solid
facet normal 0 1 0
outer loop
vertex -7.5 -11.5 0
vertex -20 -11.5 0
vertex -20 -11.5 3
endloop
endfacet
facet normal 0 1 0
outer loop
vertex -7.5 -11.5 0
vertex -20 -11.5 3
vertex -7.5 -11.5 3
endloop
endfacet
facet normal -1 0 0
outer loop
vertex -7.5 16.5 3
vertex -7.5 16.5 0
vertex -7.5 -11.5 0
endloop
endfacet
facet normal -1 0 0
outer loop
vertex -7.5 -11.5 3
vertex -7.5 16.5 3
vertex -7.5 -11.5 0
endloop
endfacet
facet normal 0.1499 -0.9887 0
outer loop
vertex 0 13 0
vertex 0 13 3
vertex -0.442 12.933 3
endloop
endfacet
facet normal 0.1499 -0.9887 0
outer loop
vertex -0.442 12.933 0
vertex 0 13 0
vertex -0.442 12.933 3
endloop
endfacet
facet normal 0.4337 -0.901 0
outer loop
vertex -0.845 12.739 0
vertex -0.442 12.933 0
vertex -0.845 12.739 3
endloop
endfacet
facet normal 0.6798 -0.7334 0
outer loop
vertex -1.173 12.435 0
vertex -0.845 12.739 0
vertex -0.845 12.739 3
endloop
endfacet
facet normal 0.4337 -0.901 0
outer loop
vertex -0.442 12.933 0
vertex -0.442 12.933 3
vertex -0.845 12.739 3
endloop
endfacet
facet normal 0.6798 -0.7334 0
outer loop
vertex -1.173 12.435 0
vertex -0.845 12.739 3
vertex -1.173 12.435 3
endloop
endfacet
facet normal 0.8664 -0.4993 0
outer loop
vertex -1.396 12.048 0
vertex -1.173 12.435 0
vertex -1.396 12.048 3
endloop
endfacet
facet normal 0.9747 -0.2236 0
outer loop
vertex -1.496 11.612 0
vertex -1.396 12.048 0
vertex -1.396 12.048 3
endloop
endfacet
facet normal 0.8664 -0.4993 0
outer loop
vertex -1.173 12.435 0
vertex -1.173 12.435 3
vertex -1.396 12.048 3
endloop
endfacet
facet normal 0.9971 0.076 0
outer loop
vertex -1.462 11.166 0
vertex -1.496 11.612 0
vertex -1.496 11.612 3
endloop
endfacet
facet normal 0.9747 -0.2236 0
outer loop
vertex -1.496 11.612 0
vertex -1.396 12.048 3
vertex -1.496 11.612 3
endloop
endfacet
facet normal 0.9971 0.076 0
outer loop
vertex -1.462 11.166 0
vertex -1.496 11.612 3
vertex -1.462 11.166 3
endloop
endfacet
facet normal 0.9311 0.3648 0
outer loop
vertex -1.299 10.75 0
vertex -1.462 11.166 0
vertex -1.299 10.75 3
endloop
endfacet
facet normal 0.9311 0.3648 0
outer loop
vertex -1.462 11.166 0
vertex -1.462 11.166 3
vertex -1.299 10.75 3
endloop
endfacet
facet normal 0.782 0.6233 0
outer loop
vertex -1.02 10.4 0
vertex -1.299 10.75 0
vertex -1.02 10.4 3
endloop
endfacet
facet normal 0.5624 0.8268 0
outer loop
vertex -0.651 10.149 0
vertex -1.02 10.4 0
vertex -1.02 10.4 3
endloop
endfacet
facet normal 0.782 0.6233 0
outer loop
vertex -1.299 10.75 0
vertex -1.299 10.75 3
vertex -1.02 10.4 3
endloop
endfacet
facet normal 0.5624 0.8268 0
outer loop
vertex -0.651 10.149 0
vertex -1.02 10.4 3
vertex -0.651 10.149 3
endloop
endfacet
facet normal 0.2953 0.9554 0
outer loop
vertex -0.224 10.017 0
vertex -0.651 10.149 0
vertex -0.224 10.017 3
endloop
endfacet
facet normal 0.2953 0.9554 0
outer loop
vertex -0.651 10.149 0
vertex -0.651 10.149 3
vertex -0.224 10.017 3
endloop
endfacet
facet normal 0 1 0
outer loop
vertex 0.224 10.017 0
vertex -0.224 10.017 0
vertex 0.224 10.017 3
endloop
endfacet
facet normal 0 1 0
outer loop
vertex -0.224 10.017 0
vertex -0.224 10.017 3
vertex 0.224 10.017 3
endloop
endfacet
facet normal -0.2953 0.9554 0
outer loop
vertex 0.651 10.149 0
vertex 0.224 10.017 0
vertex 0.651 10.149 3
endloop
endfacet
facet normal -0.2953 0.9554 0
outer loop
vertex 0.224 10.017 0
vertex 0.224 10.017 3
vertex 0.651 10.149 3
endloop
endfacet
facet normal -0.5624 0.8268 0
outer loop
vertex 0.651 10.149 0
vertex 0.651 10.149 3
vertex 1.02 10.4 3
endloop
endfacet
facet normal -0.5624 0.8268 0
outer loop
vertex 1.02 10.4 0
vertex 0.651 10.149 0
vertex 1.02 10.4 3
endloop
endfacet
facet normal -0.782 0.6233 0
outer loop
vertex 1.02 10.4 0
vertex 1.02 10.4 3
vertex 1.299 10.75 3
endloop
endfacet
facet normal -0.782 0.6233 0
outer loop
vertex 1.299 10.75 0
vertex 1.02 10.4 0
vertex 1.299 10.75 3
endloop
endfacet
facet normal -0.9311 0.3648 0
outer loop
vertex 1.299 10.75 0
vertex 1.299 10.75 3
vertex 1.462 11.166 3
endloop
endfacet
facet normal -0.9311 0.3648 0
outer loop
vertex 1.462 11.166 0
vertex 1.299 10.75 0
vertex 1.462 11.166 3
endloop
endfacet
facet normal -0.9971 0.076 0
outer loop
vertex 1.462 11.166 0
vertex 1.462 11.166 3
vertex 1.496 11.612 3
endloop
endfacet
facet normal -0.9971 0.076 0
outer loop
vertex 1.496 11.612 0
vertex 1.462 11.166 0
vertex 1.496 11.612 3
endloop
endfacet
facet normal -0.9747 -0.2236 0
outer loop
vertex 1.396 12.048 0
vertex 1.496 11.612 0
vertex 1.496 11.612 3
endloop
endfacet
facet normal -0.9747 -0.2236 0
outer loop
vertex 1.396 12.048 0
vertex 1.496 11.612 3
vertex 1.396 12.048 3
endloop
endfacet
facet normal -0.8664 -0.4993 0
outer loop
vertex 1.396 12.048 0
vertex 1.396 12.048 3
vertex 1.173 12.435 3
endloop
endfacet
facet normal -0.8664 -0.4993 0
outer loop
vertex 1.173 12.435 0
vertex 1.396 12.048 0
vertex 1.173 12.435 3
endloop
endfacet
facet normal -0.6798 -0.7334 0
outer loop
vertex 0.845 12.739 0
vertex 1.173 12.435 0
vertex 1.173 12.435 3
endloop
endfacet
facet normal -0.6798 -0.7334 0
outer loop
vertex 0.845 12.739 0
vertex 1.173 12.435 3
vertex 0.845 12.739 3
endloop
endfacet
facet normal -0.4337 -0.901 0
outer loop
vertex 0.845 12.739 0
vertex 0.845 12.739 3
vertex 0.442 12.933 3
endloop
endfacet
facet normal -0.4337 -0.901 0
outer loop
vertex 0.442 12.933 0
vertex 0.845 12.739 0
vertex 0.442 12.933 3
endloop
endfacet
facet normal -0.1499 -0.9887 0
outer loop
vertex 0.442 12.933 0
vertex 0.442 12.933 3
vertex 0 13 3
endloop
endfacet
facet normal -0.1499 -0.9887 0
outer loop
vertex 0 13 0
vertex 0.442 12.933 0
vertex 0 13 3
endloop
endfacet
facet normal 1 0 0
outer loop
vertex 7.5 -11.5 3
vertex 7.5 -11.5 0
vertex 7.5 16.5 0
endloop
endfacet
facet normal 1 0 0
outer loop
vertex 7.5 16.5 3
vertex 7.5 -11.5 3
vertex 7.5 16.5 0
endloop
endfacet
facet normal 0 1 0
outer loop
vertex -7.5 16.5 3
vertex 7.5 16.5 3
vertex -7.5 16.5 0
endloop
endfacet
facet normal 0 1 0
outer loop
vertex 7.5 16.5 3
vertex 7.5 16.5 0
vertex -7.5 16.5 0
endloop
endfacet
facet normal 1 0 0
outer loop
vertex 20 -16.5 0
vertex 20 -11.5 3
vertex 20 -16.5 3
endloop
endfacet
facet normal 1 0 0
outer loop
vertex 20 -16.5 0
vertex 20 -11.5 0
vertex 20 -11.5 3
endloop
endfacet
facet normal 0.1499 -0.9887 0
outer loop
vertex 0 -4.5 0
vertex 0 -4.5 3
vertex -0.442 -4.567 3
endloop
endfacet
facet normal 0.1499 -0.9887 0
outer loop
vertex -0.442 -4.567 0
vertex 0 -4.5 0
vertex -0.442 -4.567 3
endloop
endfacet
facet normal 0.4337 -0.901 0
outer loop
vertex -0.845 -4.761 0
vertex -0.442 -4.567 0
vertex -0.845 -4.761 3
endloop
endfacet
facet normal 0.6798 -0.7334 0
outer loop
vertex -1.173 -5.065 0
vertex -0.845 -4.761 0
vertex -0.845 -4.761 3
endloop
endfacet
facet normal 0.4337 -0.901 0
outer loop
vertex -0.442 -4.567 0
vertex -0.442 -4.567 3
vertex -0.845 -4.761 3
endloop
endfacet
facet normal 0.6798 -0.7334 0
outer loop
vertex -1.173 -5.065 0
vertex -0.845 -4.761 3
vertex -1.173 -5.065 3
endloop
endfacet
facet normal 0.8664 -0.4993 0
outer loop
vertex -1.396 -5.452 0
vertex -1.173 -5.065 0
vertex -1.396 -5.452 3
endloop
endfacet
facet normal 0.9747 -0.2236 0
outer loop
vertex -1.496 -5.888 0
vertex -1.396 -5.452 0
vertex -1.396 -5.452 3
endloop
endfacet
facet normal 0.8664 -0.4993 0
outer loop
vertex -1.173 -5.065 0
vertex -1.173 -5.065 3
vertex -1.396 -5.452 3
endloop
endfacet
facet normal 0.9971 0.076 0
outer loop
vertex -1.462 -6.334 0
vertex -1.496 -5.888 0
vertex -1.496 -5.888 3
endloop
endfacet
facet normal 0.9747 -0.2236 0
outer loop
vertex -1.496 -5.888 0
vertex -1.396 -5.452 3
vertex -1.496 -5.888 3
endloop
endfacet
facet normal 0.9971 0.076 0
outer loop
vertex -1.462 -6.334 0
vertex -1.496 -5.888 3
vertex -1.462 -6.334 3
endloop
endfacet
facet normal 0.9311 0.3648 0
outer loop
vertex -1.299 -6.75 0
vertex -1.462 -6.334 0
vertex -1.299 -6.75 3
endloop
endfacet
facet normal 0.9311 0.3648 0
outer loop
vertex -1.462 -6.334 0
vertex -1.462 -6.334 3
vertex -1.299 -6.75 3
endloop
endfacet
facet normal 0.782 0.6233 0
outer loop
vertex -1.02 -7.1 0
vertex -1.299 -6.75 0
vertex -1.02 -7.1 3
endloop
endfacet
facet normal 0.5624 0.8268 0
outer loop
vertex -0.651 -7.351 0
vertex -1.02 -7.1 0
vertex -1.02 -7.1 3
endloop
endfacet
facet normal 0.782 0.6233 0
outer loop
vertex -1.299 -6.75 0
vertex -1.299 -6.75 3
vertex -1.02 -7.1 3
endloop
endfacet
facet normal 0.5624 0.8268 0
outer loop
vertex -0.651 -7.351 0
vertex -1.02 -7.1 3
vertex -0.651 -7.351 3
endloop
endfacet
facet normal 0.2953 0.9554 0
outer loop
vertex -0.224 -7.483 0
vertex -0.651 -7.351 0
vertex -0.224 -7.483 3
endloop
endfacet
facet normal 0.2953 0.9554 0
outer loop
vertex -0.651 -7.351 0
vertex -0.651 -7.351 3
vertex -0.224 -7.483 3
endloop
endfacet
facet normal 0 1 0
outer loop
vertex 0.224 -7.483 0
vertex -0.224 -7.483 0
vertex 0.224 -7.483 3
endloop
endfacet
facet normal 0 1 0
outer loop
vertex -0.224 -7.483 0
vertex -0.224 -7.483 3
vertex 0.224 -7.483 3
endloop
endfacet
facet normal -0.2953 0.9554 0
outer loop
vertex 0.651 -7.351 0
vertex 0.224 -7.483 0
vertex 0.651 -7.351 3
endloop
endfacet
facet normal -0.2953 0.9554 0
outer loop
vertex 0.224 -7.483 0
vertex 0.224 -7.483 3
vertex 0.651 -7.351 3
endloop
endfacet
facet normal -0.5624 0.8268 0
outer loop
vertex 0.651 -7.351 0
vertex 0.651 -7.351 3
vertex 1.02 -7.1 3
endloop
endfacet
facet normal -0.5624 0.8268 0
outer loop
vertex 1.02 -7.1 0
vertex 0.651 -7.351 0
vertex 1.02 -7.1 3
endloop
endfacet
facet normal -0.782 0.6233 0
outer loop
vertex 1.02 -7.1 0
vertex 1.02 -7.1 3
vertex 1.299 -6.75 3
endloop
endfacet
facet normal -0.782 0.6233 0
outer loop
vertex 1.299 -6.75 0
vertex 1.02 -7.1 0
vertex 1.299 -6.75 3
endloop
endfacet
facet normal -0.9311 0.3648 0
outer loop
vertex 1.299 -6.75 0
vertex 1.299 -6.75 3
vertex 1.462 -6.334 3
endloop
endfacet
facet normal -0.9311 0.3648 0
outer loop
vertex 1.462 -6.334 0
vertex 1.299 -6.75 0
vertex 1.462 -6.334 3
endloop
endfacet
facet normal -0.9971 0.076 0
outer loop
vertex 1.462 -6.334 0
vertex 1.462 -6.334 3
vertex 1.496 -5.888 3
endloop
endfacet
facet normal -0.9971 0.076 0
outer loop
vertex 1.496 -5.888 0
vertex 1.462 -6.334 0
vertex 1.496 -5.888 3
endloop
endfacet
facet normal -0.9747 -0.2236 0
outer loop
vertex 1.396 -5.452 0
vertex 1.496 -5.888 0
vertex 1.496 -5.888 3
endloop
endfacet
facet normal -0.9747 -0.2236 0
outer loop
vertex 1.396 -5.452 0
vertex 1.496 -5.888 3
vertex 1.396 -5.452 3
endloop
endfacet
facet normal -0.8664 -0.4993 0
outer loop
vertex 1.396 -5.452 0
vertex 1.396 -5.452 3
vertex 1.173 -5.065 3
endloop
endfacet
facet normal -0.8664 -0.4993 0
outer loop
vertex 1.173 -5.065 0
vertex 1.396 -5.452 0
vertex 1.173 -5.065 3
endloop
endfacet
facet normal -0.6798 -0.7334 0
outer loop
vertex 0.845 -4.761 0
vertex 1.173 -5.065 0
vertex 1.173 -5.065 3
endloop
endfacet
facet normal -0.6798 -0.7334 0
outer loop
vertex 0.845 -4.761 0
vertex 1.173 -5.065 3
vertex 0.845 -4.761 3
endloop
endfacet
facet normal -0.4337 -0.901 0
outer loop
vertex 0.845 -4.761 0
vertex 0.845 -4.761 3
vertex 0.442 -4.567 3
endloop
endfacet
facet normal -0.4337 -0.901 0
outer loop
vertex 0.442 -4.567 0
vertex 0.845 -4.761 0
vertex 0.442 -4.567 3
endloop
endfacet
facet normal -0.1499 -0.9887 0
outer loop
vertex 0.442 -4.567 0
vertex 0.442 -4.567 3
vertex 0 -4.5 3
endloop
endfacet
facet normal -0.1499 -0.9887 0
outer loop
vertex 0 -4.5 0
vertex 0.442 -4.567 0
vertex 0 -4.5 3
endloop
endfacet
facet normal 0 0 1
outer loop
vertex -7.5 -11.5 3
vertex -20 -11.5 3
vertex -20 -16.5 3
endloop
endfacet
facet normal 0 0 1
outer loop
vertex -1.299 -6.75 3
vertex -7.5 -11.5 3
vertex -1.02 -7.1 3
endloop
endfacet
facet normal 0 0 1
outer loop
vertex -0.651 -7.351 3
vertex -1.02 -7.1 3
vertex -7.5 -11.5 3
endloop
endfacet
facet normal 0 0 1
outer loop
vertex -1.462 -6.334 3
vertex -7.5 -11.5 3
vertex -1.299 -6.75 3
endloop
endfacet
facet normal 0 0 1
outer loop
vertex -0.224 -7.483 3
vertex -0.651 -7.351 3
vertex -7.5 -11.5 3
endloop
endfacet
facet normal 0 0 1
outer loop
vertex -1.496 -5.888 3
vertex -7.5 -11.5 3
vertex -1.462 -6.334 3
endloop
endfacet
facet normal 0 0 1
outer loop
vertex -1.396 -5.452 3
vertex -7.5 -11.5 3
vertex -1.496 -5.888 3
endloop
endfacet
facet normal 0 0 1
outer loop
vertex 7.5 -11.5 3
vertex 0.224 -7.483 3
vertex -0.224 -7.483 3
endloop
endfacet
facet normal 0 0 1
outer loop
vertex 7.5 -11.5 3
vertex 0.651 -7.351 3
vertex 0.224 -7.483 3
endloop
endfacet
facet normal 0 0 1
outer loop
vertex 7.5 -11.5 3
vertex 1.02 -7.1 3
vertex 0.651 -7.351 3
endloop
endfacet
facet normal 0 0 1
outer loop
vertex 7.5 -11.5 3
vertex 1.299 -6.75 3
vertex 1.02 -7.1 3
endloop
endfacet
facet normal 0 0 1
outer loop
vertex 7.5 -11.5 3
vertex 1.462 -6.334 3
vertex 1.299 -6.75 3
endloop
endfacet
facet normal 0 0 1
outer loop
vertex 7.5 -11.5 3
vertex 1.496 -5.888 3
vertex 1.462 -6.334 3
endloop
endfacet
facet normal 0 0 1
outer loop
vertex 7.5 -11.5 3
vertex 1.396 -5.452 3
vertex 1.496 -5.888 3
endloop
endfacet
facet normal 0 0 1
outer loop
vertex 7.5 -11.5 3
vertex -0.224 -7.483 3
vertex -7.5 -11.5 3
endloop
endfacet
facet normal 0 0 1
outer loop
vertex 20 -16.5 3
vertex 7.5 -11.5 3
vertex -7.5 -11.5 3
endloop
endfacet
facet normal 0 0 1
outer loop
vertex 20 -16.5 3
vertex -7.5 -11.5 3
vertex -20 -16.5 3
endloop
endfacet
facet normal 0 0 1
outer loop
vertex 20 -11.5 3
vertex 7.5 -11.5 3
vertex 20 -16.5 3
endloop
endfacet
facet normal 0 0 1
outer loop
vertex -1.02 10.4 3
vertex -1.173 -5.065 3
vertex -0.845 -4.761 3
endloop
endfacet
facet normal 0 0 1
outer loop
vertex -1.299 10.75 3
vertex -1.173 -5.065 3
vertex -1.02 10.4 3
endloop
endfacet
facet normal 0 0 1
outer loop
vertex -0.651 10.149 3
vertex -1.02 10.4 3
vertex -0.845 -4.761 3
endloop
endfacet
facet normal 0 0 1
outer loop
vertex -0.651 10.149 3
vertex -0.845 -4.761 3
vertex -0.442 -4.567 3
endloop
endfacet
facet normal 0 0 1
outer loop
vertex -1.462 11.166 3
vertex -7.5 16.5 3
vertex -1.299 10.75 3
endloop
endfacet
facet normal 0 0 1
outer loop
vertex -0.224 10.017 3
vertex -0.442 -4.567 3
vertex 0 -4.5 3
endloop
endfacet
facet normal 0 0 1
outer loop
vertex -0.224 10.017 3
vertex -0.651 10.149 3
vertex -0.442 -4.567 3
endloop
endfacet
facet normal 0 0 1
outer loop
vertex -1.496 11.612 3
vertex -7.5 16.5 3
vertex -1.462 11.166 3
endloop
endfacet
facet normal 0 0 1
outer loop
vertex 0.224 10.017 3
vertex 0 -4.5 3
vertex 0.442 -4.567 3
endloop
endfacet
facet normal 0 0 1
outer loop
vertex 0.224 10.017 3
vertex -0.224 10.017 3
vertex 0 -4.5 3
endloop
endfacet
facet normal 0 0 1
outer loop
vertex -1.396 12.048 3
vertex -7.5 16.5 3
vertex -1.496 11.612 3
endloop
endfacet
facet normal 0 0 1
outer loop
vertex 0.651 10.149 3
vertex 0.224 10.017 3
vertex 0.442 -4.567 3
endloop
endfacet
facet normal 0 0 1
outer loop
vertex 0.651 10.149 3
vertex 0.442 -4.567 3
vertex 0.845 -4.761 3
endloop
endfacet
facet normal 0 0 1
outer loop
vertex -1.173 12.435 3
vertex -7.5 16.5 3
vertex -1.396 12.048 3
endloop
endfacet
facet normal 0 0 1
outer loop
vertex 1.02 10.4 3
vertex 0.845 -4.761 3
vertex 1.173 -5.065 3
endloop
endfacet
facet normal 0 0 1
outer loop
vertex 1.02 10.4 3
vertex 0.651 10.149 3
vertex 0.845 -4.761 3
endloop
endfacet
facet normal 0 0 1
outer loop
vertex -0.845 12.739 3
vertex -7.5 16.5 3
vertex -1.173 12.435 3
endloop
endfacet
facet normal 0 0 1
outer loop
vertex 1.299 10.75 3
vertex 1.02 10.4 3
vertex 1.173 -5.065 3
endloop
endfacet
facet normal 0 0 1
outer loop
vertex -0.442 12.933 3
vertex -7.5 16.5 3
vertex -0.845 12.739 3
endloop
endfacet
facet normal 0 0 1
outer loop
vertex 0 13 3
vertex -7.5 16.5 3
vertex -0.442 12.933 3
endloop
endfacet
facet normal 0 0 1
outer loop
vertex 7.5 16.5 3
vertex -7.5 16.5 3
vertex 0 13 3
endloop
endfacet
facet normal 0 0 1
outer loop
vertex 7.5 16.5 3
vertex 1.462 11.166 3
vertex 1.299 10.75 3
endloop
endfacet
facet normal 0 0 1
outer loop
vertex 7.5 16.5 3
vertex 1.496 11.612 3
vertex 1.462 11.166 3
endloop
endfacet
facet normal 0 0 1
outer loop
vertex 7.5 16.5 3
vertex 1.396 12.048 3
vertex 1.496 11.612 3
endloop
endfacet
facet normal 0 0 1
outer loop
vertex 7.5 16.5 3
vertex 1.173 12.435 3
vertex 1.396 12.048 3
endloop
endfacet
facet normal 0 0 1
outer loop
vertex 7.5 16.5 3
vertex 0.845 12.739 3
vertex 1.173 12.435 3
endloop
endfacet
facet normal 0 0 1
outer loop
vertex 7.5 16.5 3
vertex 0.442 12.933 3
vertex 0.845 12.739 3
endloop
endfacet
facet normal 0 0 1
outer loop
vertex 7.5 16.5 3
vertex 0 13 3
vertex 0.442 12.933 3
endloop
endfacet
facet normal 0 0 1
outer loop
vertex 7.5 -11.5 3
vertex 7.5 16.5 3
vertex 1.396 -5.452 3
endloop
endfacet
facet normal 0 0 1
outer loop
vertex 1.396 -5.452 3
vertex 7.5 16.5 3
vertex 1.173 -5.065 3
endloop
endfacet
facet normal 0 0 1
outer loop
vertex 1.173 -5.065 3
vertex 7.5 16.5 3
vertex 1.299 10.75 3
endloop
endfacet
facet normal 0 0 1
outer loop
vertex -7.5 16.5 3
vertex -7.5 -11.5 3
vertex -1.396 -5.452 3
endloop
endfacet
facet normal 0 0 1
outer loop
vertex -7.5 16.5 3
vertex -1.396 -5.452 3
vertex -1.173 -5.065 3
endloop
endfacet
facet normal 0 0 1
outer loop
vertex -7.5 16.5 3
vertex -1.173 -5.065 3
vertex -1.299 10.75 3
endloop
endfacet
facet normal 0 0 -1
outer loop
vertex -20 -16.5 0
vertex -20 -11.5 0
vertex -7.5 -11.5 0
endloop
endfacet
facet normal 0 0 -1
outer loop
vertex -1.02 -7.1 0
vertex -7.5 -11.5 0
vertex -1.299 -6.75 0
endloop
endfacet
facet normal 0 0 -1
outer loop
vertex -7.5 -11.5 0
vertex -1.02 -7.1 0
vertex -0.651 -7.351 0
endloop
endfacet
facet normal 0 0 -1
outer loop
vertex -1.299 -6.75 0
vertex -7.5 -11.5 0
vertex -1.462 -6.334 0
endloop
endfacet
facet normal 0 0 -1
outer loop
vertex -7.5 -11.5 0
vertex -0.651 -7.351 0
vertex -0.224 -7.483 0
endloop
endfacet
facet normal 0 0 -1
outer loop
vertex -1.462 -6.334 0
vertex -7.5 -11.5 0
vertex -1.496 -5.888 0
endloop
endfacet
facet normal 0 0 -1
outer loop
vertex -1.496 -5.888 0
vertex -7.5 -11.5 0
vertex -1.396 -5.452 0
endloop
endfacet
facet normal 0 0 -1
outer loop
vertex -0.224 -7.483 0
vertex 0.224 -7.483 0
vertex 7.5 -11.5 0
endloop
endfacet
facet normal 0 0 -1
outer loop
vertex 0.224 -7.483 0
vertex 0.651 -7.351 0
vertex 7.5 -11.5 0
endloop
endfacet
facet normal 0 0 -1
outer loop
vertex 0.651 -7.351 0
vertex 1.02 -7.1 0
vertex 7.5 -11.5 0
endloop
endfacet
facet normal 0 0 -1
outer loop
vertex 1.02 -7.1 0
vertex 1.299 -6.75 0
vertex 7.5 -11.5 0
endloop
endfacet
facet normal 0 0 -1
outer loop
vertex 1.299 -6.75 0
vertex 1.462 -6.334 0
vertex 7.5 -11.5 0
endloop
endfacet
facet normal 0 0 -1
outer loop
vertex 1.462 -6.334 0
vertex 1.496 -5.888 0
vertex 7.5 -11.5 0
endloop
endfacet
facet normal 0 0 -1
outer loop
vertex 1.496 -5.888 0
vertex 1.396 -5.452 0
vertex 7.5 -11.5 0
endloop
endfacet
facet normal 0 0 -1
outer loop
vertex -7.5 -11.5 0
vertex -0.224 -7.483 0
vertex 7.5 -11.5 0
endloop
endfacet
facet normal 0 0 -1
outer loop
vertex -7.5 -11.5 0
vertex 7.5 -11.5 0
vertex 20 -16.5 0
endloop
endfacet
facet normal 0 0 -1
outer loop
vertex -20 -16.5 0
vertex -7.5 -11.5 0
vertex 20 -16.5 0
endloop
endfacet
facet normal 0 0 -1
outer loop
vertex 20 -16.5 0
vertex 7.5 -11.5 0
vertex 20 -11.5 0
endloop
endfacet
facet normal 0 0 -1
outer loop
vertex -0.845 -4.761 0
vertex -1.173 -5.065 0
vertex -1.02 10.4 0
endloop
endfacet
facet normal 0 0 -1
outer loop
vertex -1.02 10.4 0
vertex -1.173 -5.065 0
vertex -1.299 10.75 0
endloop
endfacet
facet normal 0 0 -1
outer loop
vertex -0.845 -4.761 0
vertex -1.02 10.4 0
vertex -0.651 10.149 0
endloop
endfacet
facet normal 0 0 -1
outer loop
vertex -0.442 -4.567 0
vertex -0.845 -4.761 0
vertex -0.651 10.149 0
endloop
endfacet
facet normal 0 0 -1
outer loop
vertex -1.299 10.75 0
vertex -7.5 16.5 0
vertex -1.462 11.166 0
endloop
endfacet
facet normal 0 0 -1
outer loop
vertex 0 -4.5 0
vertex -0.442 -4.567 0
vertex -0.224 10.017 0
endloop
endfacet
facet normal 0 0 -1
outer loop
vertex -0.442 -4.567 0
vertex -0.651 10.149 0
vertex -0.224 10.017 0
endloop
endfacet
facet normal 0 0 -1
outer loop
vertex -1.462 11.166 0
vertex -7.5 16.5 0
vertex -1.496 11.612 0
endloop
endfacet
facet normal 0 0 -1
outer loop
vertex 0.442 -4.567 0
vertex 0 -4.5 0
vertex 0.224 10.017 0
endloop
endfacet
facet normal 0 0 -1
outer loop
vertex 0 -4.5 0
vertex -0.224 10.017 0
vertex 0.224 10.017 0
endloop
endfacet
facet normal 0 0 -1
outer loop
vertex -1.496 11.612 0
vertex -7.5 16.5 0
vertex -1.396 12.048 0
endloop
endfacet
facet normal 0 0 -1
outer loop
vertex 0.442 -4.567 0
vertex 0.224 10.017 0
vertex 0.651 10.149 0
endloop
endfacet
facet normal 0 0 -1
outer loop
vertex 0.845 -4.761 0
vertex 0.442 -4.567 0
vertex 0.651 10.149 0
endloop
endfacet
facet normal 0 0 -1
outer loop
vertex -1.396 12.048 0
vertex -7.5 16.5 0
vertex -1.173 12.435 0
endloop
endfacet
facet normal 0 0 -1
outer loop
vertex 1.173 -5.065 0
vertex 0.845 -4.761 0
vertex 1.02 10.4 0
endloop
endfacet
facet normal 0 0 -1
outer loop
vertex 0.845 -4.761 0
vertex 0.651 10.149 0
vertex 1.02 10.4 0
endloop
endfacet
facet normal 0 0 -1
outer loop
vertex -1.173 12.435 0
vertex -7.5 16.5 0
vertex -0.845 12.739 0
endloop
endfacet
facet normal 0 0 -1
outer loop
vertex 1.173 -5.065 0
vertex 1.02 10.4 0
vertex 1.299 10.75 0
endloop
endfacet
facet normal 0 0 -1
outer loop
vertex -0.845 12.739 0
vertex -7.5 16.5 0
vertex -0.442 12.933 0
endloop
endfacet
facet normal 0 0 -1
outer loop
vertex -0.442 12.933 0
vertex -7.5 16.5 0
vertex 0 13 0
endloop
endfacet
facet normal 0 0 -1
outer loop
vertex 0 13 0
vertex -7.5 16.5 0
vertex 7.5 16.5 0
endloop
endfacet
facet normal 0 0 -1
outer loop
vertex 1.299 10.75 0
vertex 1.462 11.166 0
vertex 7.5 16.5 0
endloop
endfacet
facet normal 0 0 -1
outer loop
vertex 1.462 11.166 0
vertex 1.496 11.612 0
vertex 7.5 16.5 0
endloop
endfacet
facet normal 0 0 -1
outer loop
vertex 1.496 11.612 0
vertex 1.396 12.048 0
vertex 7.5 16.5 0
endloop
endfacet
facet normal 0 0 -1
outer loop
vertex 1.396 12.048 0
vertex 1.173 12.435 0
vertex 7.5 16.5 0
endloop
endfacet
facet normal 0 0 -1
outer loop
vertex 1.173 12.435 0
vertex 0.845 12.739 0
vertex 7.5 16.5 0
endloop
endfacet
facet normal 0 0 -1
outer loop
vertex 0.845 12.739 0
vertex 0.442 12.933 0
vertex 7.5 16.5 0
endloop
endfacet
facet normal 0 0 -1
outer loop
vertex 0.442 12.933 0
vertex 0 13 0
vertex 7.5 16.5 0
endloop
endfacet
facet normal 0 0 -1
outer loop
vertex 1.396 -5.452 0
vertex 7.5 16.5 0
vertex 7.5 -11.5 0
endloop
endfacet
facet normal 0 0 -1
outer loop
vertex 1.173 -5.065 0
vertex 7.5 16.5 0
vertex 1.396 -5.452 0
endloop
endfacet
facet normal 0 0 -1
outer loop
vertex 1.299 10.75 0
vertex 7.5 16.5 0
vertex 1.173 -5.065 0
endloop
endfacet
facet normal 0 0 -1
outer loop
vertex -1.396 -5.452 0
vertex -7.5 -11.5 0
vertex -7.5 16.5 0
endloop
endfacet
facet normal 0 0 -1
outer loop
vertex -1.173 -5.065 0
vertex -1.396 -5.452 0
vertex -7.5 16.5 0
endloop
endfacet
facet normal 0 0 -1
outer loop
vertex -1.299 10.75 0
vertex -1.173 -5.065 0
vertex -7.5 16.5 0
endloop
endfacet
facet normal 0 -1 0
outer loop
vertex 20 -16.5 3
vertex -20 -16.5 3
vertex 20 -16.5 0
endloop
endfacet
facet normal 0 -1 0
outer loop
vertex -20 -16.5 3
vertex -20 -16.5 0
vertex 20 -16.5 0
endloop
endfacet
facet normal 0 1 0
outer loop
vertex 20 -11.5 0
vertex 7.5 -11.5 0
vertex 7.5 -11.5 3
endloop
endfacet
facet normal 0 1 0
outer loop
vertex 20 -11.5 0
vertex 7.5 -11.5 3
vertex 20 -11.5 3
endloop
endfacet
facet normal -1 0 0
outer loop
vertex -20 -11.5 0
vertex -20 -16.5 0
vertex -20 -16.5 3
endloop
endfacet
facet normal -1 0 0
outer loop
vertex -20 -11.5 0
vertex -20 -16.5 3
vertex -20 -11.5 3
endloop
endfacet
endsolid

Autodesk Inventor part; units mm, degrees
ref_plane "YZ Plane" through (0, 0, 0) normal (1, 0, 0) x (0, 1, 0)
ref_plane "XZ Plane" through (0, 0, 0) normal (0, 1, 0) x (-1, 0, 0)
ref_plane "XY Plane" through (0, 0, 0) normal (0, 0, 1) x (1, 0, 0)
sketch "Boceto1" plane through (0, 0, 0) normal (0, 0, 1) x (1, 0, 0)
  line L0 (-7.5, -16.5) -> (7.5, -16.5)
  line L1 (7.5, -16.5) -> (7.5, 16.5)
  line L2 (7.5, 16.5) -> (-7.5, 16.5)
  line L3 (-7.5, 16.5) -> (-7.5, -16.5)
  line L4 (-7.5, -16.5) -> (7.5, 16.5) construction
  line L5 (7.5, -16.5) -> (-7.5, 16.5) construction
  point P0 (0, 0)
  dimension "d7" = 33
  dimension "d8" = 15
extrude "Extrusión1" add sketch "Boceto1" along normal blind 3
sketch "Boceto2" plane through (0, 0, 0) normal (0, 0, -1) x (-1, 0, 0)
  line L0 (-20, -16.5) -> (20, -16.5)
  line L1 (20, -16.5) -> (20, -11.5)
  line L2 (20, -11.5) -> (-20, -11.5)
  line L3 (-20, -11.5) -> (-20, -16.5)
  point P0 (0, 0)
  point P1 (7.5, -16.5)
  dimension "d2" = 20
  dimension "d3" = 20
  dimension "d4" = 5
extrude "Extrusión2" add sketch "Boceto2" against normal blind 3
sketch "Boceto3" plane through (0, 0, 0) normal (0, 0, -1) x (-1, 0, 0)
  line L0 (-20, -16.5) -> (20, -16.5) construction
  point P0 (0, 0)
  point P1 (0, -6)
  point P2 (0, 11.5)
  dimension "d9" = 10.5
  dimension "d10" = 17.5
hole "Agujero1" at (0, -6, 0) at (0, 11.5, 0) direction (0, 0, 1) diameter 3 end through all
properties part number "Soporte_Motorreductor"
